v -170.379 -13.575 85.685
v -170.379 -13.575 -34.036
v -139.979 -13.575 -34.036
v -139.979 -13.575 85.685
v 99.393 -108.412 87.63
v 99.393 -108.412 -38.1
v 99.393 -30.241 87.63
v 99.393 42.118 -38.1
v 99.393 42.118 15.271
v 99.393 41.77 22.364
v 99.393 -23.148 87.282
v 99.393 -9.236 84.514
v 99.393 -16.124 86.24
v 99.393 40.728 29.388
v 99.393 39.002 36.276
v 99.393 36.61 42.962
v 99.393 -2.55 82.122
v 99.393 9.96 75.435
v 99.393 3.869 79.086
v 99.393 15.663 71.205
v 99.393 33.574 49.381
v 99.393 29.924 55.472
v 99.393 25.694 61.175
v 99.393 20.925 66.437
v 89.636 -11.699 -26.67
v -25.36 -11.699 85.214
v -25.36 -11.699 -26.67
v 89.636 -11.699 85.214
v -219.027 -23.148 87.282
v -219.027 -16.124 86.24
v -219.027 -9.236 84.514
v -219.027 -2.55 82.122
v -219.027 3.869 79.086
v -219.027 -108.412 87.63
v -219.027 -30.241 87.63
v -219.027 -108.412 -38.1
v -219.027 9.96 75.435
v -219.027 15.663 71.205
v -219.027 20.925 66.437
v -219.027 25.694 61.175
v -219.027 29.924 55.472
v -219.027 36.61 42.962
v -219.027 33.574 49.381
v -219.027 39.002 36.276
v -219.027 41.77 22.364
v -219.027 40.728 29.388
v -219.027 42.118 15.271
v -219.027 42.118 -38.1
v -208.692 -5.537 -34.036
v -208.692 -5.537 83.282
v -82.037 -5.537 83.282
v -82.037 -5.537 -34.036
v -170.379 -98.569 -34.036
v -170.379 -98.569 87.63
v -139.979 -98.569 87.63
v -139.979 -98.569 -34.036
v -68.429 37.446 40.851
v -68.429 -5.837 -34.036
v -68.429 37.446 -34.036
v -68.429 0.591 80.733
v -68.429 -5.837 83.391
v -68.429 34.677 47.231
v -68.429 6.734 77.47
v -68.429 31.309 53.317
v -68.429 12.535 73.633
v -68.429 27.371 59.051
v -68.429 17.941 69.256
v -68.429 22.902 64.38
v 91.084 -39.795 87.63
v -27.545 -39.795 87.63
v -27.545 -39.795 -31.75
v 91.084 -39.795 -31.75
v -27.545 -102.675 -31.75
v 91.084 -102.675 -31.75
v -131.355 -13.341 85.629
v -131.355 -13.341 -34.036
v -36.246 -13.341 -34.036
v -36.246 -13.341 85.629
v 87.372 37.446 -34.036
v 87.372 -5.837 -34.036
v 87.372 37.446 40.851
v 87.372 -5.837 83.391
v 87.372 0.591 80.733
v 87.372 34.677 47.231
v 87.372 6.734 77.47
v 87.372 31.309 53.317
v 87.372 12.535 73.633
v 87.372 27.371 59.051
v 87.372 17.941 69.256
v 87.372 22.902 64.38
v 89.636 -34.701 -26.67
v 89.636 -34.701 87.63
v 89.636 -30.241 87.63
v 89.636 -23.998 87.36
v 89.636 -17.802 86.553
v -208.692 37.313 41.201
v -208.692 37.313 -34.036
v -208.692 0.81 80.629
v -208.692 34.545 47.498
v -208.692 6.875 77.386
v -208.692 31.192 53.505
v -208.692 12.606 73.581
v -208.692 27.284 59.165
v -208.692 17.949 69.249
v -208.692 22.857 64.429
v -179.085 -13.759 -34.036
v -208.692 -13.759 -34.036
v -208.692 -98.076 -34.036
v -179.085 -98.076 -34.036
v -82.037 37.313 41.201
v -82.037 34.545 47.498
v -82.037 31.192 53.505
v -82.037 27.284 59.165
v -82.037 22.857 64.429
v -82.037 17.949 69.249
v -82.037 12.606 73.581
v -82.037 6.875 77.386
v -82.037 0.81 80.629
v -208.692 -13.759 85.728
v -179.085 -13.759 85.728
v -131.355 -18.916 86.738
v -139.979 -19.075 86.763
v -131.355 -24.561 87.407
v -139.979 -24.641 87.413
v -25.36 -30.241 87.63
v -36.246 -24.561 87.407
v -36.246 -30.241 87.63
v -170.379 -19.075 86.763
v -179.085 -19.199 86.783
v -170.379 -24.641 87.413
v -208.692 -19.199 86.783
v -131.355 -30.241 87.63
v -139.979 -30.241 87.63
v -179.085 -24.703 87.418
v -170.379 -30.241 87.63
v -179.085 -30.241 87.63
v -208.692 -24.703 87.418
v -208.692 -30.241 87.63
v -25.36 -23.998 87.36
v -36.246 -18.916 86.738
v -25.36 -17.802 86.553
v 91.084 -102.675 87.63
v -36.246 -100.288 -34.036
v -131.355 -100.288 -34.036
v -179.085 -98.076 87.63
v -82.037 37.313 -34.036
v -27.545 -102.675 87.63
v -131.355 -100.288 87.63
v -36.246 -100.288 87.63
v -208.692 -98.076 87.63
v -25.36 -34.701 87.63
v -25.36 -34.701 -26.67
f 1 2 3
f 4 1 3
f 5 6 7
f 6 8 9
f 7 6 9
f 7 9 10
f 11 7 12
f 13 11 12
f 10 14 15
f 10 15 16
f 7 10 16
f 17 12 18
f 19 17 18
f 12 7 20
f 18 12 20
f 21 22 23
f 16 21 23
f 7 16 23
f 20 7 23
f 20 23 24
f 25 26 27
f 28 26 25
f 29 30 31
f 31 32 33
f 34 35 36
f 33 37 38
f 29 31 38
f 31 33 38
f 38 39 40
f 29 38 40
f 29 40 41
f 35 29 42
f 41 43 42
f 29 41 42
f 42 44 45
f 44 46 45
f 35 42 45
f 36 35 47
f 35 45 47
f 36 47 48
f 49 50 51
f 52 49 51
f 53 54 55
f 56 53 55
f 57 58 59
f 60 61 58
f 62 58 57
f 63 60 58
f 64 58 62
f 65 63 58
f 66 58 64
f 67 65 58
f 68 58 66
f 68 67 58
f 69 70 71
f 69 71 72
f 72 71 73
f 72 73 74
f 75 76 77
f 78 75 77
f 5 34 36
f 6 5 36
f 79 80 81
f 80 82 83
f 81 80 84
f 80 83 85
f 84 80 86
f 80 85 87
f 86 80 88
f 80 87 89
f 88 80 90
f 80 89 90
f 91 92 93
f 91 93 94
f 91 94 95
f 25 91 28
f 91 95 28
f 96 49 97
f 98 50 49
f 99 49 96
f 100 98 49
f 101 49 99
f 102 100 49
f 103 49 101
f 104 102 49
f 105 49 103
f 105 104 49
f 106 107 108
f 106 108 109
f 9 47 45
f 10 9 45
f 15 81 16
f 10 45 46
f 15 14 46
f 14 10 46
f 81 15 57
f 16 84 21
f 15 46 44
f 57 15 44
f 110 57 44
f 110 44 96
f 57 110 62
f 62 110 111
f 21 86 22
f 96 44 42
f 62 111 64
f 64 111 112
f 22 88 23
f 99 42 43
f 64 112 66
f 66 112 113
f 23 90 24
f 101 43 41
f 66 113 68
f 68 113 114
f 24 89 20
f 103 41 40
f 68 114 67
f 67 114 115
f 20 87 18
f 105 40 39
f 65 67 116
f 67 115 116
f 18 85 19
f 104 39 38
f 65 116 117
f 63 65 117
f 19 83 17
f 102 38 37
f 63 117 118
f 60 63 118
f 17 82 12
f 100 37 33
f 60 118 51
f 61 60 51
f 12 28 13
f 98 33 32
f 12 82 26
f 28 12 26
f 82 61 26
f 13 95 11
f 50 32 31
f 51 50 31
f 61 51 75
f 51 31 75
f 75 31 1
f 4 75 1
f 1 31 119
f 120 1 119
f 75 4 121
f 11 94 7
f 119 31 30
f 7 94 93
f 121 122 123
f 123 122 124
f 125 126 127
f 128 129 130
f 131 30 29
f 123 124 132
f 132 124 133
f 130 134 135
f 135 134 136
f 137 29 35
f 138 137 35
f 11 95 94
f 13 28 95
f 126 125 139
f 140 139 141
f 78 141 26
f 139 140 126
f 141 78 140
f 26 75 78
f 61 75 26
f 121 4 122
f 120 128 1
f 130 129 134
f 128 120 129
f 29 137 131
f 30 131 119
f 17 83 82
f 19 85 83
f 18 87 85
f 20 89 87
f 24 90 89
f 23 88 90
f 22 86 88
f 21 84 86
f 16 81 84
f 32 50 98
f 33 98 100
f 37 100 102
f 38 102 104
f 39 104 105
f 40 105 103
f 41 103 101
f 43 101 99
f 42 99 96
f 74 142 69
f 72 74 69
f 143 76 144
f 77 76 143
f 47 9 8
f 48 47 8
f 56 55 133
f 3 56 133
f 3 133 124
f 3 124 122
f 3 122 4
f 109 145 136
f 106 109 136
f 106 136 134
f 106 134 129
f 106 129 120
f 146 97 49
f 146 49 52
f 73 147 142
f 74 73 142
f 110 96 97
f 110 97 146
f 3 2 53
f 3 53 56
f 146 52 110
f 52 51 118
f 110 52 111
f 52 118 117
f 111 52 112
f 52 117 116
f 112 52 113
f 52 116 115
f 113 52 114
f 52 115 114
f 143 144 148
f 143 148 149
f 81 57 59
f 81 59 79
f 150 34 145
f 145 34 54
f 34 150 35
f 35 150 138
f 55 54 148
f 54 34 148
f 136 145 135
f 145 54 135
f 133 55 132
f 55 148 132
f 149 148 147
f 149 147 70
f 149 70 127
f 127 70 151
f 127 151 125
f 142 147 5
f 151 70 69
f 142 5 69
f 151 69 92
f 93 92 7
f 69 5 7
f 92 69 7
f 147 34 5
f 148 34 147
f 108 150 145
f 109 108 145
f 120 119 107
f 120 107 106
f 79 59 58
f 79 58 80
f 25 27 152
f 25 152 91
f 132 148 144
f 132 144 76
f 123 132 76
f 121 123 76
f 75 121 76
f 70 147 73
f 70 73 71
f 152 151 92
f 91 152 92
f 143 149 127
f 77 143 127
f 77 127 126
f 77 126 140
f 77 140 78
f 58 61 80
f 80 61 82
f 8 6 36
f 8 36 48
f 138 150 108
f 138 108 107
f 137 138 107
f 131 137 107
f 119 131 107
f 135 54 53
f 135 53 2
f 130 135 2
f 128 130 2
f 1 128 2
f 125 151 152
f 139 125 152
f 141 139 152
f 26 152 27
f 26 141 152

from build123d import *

# Parameters (mm, degrees)
F0_W         = 198.7862437963
F0_H         = 84.2363908887
F1_DEPTH     = 87.63
F2_DEPTH     = 30.226
F3_DEPTH     = 38.1
F4_DEPTH     = 36.068
F5_W         = 118.6288297176
F5_H         = 62.8803037107
F6_DEPTH     = 119.38
F7_W         = 114.9956956506
F7_H         = 23.0015479028
F8_DEPTH     = 114.3
F9_DEPTH     = 216.916
F10_DEPTH    = 97.282
F11_W        = 95.1088294387
F11_H        = 86.9466327131
F14_DEPTH    = 121.666
F12_W        = 30.4002016783
F12_H        = 84.9931621924
F15_DEPTH    = 121.666
F13_W        = 29.6071916819
F13_H        = 84.3174913898
F16_DEPTH    = 121.666
F18_W        = 155.8008268476
F18_H        = 43.2829973288
F19_DEPTH    = 121.666
F17_W        = 126.6549825668
F17_H        = 42.8492124192
F20_DEPTH    = 121.666
F21_T1_DEPTH = 680.2142882536


# Not quite as in the source:
# - a fillet or chamfer that OpenCascade refuses, or shapes differently, is made with other operations: its cross-section is extruded or revolved along the edge and cut away or added


with BuildPart() as f1:
    # F0 (on Top) → F1 (new body)
    with BuildSketch(Plane.XY):
        Rectangle(F0_W, F0_H)
    extrude(amount=F1_DEPTH)

    # F2 (add): a face of the model
    f2_faces = [f1.faces().sort_by_distance(p)[0] for p in [
        (0, -42.1181954443, 43.815),
    ]]
    extrude(f2_faces, amount=F2_DEPTH)

    # F3 (add): a face of the model
    f3_faces = [f1.faces().sort_by_distance(p)[0] for p in [
        (0, -15.113, 0),
    ]]
    extrude(f3_faces, amount=F3_DEPTH)

    # F4 (add): a face of the model
    f4_faces = [f1.faces().sort_by_distance(p)[0] for p in [
        (0, -72.3441954443, 24.765),
    ]]
    extrude(f4_faces, amount=F4_DEPTH)

    # F5 (on face) → F6 (cut)
    with BuildSketch(Plane.XY.offset(87.63)):
        with Locations((31.7698940635, -71.2347794324)):
            Rectangle(F5_W, F5_H)
    extrude(amount=-F6_DEPTH, mode=Mode.SUBTRACT)

    # F7 (on face) → F8 (cut)
    with BuildSketch(Plane.XY.offset(87.63)):
        with Locations((32.1380235255, -23.2001785189)):
            Rectangle(F7_W, F7_H)
    extrude(amount=-F8_DEPTH, mode=Mode.SUBTRACT)

    # F9 (add): a face of the model
    f9_faces = [f1.faces().sort_by_distance(p)[0] for p in [
        (-99.3931218982, -33.147, 24.765),
    ]]
    extrude(f9_faces, amount=F9_DEPTH)

    # F10 (cut): a face of the model
    f10_faces = [f1.faces().sort_by_distance(p)[0] for p in [
        (-316.3091218982, -33.147, 24.765),
    ]]
    extrude(f10_faces, amount=-F10_DEPTH, mode=Mode.SUBTRACT)

    # F11 (on face) → F14 (cut)
    with BuildSketch(Plane.XY.offset(87.63)):
        with Locations((-83.8001854718, -56.8147618324)):
            Rectangle(F11_W, F11_H)
    extrude(amount=-F14_DEPTH, mode=Mode.SUBTRACT)

    # F12 (on face) → F15 (cut)
    with BuildSketch(Plane.XY.offset(87.63)):
        with Locations((-155.1787778735, -56.0720595531)):
            Rectangle(F12_W, F12_H)
    extrude(amount=-F15_DEPTH, mode=Mode.SUBTRACT)

    # F13 (on face) → F16 (cut)
    with BuildSketch(Plane.XY.offset(87.63)):
        with Locations((-193.8888058066, -55.9172849171)):
            Rectangle(F13_W, F13_H)
    extrude(amount=-F16_DEPTH, mode=Mode.SUBTRACT)

    # F18 (on face) → F19 (cut)
    with BuildSketch(Plane.XY.offset(87.63)):
        with Locations((9.4717927277, 15.8045829739)):
            Rectangle(F18_W, F18_H)
    extrude(amount=-F19_DEPTH, mode=Mode.SUBTRACT)

    # F17 (on face) → F20 (cut)
    with BuildSketch(Plane.XY.offset(87.63)):
        with Locations((-145.3649103642, 15.8879833762)):
            Rectangle(F17_W, F17_H)
    extrude(amount=-F20_DEPTH, mode=Mode.SUBTRACT)

    # F21: fillet of radius 72.3588088914 on 1 edges, made by hand

    # F21_s2 → F21_t1 (cut)
    with BuildSketch(Plane.YZ.offset(-399.9241441268)):
        with BuildLine():
            ThreePointArc((42.1181954443, 15.2711911086), (20.9247909986, 66.4365955543), (-30.2406134471, 87.63))
            Line((-30.2406134471, 87.63), (42.1181954443, 87.63))
            Line((42.1181954443, 87.63), (42.1181954443, 15.2711911086))
        make_face()
    extrude(amount=F21_T1_DEPTH, mode=Mode.SUBTRACT)


solid = f1.part
